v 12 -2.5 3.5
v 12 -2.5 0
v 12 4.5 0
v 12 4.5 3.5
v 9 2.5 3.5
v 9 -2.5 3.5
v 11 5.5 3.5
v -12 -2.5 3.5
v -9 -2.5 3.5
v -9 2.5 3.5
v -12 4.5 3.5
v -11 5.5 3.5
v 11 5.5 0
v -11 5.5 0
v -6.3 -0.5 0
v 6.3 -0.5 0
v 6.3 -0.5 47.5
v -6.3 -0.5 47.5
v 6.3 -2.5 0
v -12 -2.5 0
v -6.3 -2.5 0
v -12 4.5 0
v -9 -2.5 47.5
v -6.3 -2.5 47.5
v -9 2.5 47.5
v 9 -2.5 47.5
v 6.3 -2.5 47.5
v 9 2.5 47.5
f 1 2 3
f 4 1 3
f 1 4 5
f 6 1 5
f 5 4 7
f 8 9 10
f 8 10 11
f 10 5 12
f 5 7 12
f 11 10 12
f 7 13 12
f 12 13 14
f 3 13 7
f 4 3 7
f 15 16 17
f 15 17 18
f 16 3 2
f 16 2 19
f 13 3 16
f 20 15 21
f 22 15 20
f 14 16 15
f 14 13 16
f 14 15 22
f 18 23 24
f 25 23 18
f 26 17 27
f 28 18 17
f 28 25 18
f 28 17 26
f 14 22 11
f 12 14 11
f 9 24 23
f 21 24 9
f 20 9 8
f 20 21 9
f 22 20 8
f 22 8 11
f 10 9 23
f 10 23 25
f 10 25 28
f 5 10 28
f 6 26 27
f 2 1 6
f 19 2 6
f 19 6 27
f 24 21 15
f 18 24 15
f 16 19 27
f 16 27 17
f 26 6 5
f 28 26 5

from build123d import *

# Parameters (mm, degrees)
SKETCH_1_W          = 18
SKETCH_1_H          = 5
EXTRUDE_1_DEPTH     = 47.5
SKETCH_2_W          = 24
SKETCH_2_H          = 8
EXTRUDE_2_DEPTH     = 3.5
SKETCH_3_W          = 12.6
SKETCH_3_H          = 2
CUT_EXTRUDE_1_DEPTH = 50.30010142
CHAMFER_1_SIZE      = 1


with BuildPart() as part:
    # 草图1 → 凸台-拉伸1 (new body)
    with BuildSketch(Plane.XY):
        Rectangle(SKETCH_1_W, SKETCH_1_H)
    extrude(amount=EXTRUDE_1_DEPTH)

    # 草图2 → 凸台-拉伸2 (add)
    with BuildSketch(Plane(origin=(0, 0, 0), x_dir=(-1, 0, 0), z_dir=(0, 0, -1))):
        with Locations((0, 1.5)):
            Rectangle(SKETCH_2_W, SKETCH_2_H)
    extrude(amount=-EXTRUDE_2_DEPTH)

    # 草图3 → 切除-拉伸1 (cut, through all)
    with BuildSketch(Plane(origin=(0, 0, 0), x_dir=(-1, 0, 0), z_dir=(0, 0, -1))):
        with Locations((0, -1.5)):
            Rectangle(SKETCH_3_W, SKETCH_3_H)
    extrude(amount=-CUT_EXTRUDE_1_DEPTH, mode=Mode.SUBTRACT)

    # 倒角1
    chamfer_1_edges = [part.edges().sort_by_distance(p)[0] for p in [
        (12, 5.5, 1.75),
        (-12, 5.5, 1.75),
    ]]
    chamfer(chamfer_1_edges, length=CHAMFER_1_SIZE)


solid = part.part
